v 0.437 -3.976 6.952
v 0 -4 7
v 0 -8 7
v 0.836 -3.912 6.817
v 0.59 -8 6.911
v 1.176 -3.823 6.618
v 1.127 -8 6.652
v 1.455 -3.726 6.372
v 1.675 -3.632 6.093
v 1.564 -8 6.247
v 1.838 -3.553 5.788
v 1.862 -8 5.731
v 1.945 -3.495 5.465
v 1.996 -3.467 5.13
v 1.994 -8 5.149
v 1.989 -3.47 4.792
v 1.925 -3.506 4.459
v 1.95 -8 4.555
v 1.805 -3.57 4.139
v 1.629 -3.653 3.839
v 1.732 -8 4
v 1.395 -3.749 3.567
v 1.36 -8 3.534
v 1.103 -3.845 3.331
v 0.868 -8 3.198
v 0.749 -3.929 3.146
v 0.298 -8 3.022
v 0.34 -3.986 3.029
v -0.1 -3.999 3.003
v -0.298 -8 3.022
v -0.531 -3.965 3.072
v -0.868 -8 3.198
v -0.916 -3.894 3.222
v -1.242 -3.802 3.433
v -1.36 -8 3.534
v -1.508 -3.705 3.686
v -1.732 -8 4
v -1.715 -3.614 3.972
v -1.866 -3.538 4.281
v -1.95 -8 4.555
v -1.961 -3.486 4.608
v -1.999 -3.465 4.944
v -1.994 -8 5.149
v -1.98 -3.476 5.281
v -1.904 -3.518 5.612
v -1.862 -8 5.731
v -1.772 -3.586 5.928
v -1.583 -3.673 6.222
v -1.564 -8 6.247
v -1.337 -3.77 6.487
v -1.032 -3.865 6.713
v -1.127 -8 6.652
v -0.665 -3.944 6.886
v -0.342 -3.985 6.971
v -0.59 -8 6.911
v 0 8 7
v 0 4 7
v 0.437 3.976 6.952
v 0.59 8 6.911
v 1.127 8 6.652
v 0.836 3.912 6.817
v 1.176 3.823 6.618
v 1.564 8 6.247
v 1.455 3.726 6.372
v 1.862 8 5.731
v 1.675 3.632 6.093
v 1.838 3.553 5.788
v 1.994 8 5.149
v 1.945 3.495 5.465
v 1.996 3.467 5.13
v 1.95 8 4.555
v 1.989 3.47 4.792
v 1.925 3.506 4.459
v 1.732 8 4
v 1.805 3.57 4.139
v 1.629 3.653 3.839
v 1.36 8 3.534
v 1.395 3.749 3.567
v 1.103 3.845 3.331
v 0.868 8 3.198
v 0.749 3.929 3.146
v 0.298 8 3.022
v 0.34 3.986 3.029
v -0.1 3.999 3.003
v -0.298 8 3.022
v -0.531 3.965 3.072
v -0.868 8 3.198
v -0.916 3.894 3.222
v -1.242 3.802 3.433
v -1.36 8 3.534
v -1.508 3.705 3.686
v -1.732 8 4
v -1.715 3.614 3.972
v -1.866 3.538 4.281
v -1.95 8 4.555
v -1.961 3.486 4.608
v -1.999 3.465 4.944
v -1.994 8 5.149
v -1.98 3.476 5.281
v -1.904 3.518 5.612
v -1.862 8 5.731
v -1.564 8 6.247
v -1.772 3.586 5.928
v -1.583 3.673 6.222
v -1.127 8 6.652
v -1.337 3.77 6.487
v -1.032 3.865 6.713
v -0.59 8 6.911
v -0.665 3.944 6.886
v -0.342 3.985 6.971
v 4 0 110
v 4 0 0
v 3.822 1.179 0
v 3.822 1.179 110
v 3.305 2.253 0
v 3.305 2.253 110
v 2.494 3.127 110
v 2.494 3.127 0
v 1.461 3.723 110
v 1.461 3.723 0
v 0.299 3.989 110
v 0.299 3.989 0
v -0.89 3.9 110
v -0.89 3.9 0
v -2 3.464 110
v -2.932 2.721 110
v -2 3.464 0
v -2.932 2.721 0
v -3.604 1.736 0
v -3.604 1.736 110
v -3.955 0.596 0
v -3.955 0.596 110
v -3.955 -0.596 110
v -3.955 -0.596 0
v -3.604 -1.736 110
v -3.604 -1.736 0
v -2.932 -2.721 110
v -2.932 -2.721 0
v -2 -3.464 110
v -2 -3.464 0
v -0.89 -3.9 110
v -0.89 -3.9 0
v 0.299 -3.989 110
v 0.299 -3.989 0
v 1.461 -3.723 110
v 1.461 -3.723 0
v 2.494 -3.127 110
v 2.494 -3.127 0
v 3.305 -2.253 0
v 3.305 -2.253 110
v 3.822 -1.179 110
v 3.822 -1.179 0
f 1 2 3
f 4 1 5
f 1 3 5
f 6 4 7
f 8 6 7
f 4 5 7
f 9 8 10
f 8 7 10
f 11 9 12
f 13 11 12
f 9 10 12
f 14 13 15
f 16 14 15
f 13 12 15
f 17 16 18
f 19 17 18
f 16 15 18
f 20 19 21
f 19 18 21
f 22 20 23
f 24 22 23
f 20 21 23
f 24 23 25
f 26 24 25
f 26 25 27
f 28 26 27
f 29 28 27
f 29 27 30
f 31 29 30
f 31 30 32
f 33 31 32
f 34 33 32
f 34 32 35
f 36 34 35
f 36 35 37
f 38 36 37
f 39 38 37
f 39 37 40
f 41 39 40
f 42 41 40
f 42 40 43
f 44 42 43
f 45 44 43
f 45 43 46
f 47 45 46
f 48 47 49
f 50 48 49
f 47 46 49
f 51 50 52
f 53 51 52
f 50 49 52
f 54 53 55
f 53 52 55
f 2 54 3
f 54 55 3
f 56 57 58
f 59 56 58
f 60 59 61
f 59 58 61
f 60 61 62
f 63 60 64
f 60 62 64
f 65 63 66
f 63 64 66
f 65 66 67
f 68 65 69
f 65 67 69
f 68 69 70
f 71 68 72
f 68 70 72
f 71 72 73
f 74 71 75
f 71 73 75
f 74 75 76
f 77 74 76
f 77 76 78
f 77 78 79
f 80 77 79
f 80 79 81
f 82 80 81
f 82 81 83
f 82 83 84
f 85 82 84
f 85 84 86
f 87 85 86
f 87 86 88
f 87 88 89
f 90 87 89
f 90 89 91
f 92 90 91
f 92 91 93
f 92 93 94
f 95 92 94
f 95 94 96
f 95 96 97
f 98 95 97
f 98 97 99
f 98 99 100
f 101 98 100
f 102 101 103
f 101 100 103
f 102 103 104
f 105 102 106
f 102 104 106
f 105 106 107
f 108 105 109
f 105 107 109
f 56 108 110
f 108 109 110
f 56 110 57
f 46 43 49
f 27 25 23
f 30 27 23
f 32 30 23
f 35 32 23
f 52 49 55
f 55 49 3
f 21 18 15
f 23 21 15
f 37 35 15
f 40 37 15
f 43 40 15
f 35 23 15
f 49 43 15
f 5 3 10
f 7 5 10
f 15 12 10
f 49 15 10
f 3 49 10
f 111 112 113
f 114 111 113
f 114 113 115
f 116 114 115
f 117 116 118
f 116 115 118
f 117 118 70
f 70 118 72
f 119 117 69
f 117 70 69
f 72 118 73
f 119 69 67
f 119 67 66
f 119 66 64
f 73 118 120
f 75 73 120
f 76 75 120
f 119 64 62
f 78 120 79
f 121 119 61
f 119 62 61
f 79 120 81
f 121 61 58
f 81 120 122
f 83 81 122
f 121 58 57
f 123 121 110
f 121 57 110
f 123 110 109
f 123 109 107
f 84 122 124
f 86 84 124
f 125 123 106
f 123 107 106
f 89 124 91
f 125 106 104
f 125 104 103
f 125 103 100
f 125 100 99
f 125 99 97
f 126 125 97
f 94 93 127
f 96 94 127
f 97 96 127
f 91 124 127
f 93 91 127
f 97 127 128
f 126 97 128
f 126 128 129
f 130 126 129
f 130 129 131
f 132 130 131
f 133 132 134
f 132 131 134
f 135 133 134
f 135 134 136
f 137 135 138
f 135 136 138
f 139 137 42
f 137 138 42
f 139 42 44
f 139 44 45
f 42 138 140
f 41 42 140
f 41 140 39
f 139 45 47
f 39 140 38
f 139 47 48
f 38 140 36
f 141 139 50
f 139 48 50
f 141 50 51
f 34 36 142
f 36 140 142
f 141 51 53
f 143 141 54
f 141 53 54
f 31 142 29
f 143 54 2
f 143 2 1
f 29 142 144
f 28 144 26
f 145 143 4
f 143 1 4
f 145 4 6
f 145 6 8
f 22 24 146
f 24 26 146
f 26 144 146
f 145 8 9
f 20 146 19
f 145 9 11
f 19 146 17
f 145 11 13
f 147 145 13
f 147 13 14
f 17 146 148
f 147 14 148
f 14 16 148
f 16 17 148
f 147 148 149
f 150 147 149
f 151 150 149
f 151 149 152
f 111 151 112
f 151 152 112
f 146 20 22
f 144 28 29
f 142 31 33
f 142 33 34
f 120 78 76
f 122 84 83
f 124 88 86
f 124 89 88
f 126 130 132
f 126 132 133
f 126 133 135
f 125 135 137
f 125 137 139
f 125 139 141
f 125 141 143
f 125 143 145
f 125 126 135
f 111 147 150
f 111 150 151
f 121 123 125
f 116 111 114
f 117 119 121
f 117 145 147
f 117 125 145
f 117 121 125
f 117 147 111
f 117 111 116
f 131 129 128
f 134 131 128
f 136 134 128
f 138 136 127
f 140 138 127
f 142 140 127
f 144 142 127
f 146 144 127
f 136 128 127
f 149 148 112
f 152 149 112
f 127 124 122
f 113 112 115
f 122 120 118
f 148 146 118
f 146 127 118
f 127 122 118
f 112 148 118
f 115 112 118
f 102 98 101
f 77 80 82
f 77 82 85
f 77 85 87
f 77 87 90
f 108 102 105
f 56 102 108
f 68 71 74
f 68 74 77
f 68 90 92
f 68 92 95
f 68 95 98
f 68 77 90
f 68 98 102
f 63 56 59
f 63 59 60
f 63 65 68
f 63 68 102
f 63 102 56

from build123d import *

# Parameters (mm, degrees)
SKETCH1_R                = 4
BOSS_EXTRUDE1_DEPTH      = 110
BOSS_EXTRUDE2_DEPTH      = 8
BOSS_EXTRUDE2_DEPTH_BACK = 8
SKETCH2_R                = 2


with BuildPart() as part:
    # Sketch1 → Boss-Extrude1 (new body)
    with BuildSketch(Plane.XY):
        Circle(SKETCH1_R)
    extrude(amount=BOSS_EXTRUDE1_DEPTH)

    # Sketch2 → Boss-Extrude2 (add, two sides: drawn at the far end of the back side and taken through both)
    with BuildSketch(Plane(origin=(0, 0, 0), x_dir=(1, 0, 0), z_dir=(0, 1, 0)).offset(-BOSS_EXTRUDE2_DEPTH_BACK)):
        with Locations((0, -5)):
            Circle(SKETCH2_R)
    extrude(amount=BOSS_EXTRUDE2_DEPTH + BOSS_EXTRUDE2_DEPTH_BACK)


solid = part.part
